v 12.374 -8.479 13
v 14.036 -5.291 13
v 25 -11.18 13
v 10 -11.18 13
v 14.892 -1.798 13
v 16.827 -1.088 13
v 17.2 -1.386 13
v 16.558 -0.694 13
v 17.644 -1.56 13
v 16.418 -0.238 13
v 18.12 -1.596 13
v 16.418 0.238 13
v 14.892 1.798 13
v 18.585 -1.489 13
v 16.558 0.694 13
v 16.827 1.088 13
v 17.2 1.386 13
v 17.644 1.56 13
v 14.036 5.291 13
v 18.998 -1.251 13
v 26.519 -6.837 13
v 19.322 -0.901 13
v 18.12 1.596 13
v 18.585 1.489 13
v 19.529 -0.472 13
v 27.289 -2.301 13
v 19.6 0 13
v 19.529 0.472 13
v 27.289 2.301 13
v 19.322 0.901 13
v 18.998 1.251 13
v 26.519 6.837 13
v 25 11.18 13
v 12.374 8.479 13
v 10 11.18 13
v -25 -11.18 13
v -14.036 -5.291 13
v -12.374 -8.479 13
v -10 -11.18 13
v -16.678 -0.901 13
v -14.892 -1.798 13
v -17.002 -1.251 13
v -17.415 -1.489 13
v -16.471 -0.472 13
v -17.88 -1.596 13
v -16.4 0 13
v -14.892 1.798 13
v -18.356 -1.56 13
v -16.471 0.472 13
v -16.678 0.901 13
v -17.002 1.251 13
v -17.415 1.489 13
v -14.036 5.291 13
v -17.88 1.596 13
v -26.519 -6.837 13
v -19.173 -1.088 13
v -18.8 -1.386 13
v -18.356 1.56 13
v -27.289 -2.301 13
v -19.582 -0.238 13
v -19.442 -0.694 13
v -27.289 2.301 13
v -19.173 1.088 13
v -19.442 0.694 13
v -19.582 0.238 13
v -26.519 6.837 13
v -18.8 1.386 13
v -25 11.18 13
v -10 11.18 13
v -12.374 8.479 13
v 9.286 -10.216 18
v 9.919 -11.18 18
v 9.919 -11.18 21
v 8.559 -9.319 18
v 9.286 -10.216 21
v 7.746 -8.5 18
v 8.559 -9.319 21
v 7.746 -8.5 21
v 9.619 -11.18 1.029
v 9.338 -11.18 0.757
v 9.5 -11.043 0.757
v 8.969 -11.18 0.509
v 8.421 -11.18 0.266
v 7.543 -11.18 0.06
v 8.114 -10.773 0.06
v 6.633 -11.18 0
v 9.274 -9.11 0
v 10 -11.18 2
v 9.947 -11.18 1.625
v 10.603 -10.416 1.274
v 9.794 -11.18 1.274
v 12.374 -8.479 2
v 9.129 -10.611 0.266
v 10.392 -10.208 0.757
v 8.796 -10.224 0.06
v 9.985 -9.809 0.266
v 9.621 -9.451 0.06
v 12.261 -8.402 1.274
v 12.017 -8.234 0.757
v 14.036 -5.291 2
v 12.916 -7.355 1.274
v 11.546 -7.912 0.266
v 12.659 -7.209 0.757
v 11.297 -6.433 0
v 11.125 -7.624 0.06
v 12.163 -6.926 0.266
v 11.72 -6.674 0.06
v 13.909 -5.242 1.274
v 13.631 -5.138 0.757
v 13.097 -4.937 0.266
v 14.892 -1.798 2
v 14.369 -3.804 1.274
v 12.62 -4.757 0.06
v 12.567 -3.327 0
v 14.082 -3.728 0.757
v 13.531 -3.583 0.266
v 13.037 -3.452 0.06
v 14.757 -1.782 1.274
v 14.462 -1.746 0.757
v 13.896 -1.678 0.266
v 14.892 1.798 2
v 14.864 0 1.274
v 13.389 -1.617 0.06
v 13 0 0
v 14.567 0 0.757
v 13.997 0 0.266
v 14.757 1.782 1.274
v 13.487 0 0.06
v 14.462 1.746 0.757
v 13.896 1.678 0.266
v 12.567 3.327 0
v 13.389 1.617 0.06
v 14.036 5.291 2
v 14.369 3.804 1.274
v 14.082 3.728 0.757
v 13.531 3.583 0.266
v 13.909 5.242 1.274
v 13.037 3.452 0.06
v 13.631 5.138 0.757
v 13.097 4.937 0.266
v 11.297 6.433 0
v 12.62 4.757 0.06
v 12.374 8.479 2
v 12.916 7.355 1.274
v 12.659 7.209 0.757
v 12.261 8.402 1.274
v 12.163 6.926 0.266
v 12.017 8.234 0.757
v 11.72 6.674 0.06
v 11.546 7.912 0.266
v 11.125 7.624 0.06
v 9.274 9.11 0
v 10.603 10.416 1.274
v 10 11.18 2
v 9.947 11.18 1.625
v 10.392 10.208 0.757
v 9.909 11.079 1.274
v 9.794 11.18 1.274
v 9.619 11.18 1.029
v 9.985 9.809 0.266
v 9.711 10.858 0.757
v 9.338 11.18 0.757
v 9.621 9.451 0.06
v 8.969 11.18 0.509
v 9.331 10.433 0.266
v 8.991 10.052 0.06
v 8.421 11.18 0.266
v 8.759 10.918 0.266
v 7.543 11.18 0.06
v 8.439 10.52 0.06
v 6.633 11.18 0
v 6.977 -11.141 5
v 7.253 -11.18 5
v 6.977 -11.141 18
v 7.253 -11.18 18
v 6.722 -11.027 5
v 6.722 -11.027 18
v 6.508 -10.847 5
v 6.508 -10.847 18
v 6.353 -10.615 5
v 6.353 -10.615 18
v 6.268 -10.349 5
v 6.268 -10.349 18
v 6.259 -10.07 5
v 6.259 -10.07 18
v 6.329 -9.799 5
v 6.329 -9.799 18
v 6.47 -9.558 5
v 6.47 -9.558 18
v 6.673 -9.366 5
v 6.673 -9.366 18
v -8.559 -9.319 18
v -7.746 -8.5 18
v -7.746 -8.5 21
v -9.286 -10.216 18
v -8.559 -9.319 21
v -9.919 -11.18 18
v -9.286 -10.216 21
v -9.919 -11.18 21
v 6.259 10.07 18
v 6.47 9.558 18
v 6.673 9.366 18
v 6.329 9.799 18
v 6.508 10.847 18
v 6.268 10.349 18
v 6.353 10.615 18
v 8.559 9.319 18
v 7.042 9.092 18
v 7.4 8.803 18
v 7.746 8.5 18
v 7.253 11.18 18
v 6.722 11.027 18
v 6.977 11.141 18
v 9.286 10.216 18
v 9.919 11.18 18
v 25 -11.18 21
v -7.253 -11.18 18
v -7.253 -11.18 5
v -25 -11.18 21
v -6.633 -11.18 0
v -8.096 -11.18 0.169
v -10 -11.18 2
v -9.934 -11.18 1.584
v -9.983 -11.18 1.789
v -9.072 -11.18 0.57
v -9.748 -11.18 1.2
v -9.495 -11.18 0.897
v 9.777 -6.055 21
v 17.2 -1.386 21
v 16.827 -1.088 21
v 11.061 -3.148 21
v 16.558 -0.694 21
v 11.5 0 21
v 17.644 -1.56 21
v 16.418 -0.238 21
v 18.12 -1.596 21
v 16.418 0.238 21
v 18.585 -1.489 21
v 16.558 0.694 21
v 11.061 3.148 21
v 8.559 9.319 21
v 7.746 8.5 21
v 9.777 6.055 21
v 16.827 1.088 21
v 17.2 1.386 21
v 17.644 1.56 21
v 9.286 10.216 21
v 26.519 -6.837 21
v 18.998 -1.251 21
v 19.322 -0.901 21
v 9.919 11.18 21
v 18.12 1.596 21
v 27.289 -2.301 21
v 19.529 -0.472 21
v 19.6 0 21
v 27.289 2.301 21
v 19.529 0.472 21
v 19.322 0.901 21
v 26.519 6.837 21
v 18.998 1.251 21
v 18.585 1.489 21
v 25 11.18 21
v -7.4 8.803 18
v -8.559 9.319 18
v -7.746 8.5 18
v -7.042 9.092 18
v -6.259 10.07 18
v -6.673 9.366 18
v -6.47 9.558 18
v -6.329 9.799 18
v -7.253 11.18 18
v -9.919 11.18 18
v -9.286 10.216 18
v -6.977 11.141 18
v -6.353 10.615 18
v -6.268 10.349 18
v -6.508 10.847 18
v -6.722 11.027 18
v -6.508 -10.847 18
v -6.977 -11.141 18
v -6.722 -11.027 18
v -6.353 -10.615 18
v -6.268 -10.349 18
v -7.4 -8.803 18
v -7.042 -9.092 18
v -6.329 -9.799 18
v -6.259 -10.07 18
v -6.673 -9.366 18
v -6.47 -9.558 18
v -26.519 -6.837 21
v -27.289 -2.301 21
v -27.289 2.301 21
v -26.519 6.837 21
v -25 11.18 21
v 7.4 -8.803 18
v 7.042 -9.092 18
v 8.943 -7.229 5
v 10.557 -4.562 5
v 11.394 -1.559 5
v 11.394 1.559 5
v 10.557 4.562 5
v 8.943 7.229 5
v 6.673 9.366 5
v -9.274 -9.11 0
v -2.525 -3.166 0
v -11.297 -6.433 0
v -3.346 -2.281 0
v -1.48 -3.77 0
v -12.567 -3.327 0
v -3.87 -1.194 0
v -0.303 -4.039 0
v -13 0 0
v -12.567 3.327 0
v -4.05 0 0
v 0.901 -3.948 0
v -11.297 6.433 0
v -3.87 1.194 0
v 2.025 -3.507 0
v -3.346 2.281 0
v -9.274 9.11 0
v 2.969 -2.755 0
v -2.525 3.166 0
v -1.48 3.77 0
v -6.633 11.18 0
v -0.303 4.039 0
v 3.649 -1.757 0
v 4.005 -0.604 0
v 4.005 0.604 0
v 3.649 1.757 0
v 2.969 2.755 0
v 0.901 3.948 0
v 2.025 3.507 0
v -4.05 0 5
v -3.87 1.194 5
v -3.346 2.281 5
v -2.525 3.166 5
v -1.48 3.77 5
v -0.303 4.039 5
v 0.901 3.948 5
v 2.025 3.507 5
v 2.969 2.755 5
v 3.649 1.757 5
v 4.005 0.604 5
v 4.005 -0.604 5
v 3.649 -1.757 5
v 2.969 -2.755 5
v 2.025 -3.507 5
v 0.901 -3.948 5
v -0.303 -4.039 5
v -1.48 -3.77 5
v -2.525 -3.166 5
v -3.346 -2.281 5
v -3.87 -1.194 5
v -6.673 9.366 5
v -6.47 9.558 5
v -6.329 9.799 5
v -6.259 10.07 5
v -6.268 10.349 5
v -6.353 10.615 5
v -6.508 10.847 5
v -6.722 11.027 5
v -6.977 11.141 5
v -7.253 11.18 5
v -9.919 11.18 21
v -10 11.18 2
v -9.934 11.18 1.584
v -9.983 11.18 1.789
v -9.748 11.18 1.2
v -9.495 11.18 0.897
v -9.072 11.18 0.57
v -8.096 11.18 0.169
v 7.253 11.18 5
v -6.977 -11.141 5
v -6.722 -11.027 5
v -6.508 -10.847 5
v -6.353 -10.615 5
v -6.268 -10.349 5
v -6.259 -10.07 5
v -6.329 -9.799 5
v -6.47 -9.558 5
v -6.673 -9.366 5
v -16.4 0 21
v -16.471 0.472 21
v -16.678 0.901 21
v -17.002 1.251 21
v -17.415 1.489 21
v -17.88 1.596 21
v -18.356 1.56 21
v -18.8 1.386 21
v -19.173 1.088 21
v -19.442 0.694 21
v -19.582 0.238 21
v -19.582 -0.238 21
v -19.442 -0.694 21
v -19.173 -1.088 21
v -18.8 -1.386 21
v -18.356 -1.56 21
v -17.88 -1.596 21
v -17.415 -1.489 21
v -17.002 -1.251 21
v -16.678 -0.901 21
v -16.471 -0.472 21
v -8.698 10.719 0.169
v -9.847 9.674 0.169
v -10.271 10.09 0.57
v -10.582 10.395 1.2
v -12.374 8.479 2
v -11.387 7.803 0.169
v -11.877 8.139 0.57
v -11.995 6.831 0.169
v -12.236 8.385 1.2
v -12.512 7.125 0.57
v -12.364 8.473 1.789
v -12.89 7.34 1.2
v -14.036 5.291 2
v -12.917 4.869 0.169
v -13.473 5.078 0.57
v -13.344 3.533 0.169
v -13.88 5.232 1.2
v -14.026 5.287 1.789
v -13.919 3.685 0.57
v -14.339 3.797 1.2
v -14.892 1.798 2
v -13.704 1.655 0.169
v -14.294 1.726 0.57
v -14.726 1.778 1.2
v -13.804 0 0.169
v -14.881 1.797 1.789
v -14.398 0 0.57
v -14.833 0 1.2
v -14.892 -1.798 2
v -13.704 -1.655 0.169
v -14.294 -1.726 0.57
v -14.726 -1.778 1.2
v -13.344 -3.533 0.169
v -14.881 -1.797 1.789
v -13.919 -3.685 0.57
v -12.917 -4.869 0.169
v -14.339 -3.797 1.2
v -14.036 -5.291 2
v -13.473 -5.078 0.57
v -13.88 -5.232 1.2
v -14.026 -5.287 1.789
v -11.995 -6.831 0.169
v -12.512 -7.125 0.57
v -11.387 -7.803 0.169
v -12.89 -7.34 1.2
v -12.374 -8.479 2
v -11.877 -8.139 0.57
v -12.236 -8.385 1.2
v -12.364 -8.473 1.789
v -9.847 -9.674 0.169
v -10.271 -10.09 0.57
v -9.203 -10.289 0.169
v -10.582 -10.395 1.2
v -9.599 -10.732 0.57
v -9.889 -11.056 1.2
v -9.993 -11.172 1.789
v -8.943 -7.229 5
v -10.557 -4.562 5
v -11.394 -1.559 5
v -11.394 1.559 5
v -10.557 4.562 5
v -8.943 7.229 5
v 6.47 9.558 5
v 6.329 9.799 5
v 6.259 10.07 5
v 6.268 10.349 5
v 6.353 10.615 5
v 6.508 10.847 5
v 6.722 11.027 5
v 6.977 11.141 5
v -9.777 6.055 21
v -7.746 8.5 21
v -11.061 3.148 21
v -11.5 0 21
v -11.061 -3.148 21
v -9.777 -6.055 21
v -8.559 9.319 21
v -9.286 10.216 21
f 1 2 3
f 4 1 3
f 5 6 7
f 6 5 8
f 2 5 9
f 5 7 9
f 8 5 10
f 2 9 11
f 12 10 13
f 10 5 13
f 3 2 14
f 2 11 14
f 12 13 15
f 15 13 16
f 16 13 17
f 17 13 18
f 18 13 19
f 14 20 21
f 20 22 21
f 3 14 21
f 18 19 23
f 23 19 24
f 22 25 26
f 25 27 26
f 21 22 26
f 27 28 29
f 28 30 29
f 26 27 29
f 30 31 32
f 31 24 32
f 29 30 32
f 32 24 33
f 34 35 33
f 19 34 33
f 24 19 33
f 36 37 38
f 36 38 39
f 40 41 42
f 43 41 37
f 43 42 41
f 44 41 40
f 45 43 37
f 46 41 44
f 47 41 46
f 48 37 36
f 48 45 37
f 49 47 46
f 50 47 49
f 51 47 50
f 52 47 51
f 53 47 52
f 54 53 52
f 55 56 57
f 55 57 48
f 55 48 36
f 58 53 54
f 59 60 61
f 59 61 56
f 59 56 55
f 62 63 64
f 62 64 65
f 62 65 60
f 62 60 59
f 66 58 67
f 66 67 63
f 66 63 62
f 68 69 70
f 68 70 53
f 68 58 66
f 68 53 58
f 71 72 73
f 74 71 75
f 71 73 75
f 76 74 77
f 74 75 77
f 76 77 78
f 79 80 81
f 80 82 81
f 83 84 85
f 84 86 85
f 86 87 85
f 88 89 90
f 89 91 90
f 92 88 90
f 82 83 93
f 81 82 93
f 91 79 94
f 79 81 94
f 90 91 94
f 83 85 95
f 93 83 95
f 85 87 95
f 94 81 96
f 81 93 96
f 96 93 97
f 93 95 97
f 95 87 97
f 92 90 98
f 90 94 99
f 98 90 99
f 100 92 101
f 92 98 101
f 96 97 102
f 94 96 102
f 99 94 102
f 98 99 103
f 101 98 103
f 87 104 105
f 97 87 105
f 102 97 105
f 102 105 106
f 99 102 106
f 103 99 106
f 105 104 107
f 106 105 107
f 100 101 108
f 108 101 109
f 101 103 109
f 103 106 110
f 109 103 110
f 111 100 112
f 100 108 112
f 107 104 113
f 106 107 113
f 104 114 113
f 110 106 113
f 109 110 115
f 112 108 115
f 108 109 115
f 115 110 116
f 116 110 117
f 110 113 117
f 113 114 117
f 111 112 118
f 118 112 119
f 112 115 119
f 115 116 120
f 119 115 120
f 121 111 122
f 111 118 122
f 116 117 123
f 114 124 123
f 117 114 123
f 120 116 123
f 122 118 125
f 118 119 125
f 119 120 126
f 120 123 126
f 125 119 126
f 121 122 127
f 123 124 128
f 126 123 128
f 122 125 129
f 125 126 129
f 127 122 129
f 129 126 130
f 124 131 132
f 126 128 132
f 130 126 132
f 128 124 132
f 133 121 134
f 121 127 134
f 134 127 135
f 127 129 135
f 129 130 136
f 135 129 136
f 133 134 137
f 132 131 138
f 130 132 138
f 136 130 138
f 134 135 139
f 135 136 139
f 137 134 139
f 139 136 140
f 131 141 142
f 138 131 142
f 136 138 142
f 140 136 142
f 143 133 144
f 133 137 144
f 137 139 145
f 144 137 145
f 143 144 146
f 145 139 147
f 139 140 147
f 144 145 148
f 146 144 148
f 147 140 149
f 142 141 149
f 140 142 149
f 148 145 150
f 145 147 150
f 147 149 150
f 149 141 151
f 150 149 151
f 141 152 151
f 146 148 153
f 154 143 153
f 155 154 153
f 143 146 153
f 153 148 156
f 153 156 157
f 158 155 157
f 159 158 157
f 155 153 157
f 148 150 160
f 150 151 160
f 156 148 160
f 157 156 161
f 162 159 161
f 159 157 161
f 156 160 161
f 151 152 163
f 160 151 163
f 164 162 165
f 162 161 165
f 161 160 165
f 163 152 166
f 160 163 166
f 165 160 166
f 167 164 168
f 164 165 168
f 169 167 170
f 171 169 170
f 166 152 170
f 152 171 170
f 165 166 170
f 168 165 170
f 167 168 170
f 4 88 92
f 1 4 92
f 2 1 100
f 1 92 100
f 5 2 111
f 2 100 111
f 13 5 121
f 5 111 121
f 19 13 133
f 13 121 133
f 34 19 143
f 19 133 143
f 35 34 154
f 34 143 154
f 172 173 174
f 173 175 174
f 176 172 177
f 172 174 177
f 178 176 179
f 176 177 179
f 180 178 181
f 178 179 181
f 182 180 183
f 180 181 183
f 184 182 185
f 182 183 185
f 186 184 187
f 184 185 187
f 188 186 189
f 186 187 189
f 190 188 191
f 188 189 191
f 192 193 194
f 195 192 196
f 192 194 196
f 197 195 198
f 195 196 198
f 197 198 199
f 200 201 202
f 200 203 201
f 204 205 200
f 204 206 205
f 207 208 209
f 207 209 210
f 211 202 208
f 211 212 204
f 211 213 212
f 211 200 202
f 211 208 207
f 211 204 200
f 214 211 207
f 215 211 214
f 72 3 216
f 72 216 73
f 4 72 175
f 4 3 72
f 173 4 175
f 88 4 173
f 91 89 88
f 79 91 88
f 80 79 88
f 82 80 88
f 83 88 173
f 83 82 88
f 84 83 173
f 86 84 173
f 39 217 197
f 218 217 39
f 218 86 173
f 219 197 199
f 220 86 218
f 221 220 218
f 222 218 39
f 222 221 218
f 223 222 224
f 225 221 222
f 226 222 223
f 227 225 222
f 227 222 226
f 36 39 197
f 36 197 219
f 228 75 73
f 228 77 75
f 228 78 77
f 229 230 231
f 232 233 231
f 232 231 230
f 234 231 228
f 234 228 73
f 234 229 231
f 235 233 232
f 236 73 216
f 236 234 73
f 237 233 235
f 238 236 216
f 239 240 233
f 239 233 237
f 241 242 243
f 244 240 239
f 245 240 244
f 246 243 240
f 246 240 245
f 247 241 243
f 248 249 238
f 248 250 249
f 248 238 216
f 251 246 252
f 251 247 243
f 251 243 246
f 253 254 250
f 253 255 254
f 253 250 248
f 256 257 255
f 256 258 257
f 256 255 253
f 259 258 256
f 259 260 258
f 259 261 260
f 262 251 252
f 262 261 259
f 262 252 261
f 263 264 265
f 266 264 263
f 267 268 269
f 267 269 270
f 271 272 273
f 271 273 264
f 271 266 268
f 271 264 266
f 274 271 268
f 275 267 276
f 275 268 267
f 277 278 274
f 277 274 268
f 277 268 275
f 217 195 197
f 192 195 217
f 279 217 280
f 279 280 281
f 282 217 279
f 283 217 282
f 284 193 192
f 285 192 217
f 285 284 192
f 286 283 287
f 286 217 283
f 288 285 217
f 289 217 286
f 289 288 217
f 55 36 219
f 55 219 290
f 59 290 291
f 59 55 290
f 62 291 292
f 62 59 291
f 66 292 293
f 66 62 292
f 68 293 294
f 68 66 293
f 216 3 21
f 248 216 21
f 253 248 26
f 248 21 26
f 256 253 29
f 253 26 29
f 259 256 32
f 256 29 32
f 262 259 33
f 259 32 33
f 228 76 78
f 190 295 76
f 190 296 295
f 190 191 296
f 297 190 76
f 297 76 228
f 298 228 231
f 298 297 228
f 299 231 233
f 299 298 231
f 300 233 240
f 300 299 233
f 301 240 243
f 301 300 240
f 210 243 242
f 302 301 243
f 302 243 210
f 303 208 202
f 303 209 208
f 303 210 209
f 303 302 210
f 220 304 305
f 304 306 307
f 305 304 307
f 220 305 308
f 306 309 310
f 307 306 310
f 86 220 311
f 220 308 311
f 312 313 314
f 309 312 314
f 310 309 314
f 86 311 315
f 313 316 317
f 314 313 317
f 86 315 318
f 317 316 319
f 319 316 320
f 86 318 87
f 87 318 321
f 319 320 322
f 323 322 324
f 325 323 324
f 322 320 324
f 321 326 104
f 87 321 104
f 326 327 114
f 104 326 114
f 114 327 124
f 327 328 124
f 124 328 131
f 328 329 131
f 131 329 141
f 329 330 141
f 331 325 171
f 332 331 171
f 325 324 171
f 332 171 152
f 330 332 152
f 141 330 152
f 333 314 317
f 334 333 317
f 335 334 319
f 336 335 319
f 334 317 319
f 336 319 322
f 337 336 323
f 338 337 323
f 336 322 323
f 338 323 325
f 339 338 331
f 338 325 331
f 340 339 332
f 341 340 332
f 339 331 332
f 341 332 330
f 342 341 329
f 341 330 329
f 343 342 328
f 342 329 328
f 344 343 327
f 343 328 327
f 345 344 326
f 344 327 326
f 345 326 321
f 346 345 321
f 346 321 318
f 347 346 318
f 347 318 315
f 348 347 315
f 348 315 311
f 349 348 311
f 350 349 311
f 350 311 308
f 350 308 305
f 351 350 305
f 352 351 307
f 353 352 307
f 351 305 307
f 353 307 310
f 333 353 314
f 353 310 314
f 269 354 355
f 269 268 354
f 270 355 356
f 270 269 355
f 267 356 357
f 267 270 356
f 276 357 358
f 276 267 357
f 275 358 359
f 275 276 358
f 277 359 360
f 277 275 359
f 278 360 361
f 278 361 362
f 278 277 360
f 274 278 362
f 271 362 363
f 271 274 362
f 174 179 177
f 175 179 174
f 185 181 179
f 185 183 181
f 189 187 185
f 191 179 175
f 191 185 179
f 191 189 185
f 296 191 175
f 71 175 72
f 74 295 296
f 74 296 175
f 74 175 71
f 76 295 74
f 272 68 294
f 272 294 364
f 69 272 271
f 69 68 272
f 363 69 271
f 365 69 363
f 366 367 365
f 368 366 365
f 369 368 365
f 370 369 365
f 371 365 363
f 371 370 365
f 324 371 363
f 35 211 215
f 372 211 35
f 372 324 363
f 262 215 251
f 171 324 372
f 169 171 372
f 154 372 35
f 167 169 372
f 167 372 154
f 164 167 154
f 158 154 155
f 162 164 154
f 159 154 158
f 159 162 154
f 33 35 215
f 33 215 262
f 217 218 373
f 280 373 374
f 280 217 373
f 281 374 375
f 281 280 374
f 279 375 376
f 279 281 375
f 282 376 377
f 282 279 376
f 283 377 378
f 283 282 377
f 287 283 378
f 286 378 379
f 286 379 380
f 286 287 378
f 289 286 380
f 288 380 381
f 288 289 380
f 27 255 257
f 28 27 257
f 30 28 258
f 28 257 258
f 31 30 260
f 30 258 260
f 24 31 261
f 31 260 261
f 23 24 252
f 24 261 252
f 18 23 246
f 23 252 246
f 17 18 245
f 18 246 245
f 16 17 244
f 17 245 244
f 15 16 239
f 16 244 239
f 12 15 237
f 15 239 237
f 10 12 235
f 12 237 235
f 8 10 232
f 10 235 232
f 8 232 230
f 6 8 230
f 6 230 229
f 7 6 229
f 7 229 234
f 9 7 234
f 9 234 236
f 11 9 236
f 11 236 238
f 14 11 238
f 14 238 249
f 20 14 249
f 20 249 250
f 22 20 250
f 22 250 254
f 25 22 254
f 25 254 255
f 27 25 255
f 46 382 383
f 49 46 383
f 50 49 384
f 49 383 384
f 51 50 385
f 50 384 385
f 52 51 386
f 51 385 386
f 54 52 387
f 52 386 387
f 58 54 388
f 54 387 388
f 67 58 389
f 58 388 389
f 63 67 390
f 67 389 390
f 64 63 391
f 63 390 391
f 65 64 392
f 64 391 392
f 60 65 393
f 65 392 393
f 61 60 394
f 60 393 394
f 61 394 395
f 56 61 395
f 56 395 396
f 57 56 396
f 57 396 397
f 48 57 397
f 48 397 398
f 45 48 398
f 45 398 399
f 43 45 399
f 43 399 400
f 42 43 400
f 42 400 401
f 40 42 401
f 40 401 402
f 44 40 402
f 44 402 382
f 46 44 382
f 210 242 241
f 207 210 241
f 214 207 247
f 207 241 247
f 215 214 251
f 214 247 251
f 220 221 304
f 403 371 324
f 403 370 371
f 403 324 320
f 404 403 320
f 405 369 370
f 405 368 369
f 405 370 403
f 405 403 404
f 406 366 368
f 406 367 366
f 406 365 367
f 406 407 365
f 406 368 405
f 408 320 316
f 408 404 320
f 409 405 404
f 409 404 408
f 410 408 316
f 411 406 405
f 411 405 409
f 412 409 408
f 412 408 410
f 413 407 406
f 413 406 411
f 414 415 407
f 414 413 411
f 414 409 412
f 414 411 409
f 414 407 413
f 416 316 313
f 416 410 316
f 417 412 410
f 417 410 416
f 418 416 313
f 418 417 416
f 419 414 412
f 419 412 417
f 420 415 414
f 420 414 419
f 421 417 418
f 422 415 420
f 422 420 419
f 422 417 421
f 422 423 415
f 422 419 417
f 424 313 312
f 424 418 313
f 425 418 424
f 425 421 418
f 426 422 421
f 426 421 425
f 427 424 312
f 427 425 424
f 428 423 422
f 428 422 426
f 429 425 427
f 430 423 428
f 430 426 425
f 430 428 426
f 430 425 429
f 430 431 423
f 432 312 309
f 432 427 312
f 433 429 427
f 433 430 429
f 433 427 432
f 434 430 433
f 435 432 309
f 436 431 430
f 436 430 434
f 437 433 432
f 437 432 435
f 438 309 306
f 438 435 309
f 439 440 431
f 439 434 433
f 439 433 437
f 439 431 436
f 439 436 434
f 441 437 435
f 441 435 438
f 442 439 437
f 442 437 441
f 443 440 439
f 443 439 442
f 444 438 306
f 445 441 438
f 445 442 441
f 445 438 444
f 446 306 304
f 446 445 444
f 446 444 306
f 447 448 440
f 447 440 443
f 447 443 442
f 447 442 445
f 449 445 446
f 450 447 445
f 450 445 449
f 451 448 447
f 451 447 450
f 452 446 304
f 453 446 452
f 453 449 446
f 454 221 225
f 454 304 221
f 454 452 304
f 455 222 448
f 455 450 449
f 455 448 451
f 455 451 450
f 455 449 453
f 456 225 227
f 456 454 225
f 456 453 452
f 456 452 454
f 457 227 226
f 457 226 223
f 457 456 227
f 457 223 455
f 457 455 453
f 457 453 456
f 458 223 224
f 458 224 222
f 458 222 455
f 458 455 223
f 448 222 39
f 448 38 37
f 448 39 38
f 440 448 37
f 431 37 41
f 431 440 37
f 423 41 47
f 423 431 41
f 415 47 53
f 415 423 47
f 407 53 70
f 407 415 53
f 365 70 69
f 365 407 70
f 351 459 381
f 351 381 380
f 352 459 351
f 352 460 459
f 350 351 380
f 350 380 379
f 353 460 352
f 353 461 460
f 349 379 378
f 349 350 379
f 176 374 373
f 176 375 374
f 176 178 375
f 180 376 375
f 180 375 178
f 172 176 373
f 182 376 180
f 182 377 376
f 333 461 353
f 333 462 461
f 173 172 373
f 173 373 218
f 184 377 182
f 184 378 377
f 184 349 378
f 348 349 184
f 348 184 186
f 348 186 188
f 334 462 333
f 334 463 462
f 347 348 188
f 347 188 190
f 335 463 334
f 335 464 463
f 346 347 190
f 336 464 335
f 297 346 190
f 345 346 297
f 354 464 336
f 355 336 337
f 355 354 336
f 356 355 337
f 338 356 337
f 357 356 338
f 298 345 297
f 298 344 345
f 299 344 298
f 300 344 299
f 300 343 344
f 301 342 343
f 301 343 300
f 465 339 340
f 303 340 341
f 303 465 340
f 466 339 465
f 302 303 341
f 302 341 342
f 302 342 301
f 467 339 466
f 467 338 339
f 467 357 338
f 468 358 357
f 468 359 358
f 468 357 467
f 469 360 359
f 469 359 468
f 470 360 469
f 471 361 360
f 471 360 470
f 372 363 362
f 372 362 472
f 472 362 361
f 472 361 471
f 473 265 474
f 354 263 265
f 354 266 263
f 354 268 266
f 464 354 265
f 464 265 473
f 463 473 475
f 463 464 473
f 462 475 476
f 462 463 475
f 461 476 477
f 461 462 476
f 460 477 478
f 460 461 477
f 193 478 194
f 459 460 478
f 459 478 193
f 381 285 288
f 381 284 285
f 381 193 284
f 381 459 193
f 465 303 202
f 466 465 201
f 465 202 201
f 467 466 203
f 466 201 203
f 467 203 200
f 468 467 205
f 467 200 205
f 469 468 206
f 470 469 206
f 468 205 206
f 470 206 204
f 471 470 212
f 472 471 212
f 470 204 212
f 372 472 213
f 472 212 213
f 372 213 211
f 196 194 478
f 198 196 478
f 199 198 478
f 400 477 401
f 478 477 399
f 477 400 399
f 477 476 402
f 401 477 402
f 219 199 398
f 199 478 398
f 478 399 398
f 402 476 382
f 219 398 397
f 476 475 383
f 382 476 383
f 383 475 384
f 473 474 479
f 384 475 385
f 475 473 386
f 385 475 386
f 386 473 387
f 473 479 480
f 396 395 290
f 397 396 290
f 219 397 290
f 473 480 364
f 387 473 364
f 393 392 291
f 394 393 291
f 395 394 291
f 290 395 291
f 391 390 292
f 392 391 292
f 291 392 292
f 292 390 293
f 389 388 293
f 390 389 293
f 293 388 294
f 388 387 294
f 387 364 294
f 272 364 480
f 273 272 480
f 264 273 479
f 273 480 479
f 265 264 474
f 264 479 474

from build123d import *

# Parameters (mm, degrees)
SKETCH_1_W          = 20
SKETCH_1_H          = 22.3606797749979
EXTRUDE_1_DEPTH     = 5
SKETCH_2_R          = 4.05
CUT_EXTRUDE_1_DEPTH = 5
EXTRUDE_2_DEPTH     = 16
EXTRUDE_START       = -8
EXTRUDE_3_DEPTH     = 8
SKETCH_5_R          = 11.5
CUT_EXTRUDE_2_DEPTH = 3
FILLET_2_R          = 2
SKETCH_6_R          = 1.6000000000000016
CUT_EXTRUDE_3_DEPTH = 13
FILLET_3_R          = 1


with BuildPart() as part:
    # 草图1 → 凸台-拉伸1 (new body)
    with BuildSketch(Plane.XY):
        with BuildLine():
            Line((-10, -11.18033988749895), (-10, 11.18033988749895))
            ThreePointArc((-10, 11.180339887498945), (-14.999999999999998, 1.84e-15), (-10.000000000000004, -11.180339887498944))
        make_face()
        Rectangle(SKETCH_1_W, SKETCH_1_H)
        with BuildLine():
            ThreePointArc((14.999999999999998, 0), (13.69306393762915, 6.123724356957945), (9.999999999999998, 11.180339887498947))
            Line((10, 11.18033988749895), (10, -11.18033988749895))
            ThreePointArc((9.999999999999998, -11.180339887498947), (13.69306393762915, -6.123724356957946), (14.999999999999998, -3.67e-15))
        make_face()
    extrude(amount=EXTRUDE_1_DEPTH)

    # 草图2 → 切除-拉伸1 (cut)
    with BuildSketch(Plane(origin=(0, 0, 0), x_dir=(-1, 0, 0), z_dir=(0, 0, -1))):
        Circle(SKETCH_2_R)
    extrude(amount=-CUT_EXTRUDE_1_DEPTH, mode=Mode.SUBTRACT)

    # 草图3 → 凸台-拉伸2 (add)
    with BuildSketch(Plane.XY.offset(5)):
        with BuildLine():
            Line((-10, 11.18033988749895), (-2.6925824035672443, 11.18033988749895))
            ThreePointArc((-2.6925824035672443, 11.18033988749895), (-11.5, 1.41e-15), (-2.6925824035672443, -11.18033988749895))
            Line((-2.6925824035672443, -11.18033988749895), (-10, -11.18033988749895))
            ThreePointArc((-10, -11.18033988749895), (-15.000000000000002, 1.84e-15), (-10, 11.18033988749895))
        make_face()
        with BuildLine():
            Line((2.692582403567243, 11.18033988749895), (10, 11.18033988749895))
            ThreePointArc((10, 11.18033988749895), (15.000000000000002, 0), (10, -11.18033988749895))
            Line((10, -11.18033988749895), (2.6925824035672443, -11.18033988749895))
            ThreePointArc((2.6925824035672443, -11.18033988749895), (11.5, 0), (2.692582403567243, 11.18033988749895))
        make_face()
    extrude(amount=EXTRUDE_2_DEPTH)

    # 草图4 → 凸台-拉伸3 (add)
    with BuildSketch(Plane.XY.offset(21).offset(EXTRUDE_START)):
        with BuildLine():
            Line((10, -11.18033988749895), (25, -11.18033988749895))
            ThreePointArc((25, -11.18033988749895), (27.386127875258307, 0), (25, 11.180339887498949))
            Line((25, 11.180339887498949), (10, 11.18033988749895))
            ThreePointArc((10, 11.18033988749895), (15.000000000000002, 0), (10, -11.18033988749895))
        make_face()
    extrude_3 = extrude(amount=EXTRUDE_3_DEPTH)

    # 镜向1: 凸台-拉伸3 across plane
    add(extrude_3.mirror(Plane(origin=(0, 0, 0), x_dir=(0, 0, 1), z_dir=(1, 0, 0))))

    # 草图5 → 切除-拉伸2 (cut)
    with BuildSketch(Plane.XY.offset(21)):
        with Locations((0, 17)):
            Circle(SKETCH_5_R)
        with Locations((0, -17)):
            Circle(SKETCH_5_R)
    extrude(amount=-CUT_EXTRUDE_2_DEPTH, mode=Mode.SUBTRACT)

    # 圆角2
    fillet_2_edges = [part.edges().sort_by_distance(p)[0] for p in [
        (14.999999999999998, 3.55e-15, 0),
        (-14.999999999999996, 2.22e-15, 0),
    ]]
    fillet(fillet_2_edges, radius=FILLET_2_R)

    # 草图6 → 切除-拉伸3 (cut)
    with BuildSketch(Plane.XY.offset(21)):
        with Locations((18, 0)):
            Circle(SKETCH_6_R)
        with Locations((-18, 0)):
            Circle(SKETCH_6_R)
    extrude(amount=-CUT_EXTRUDE_3_DEPTH, mode=Mode.SUBTRACT)

    # 圆角3
    fillet_3_edges = [part.edges().sort_by_distance(p)[0] for p in [
        (2.6925824035672443, -11.18033988749895, 11.5),
        (2.6925824035672443, 11.18033988749895, 11.5),
        (-2.6925824035672443, 11.18033988749895, 11.5),
        (-2.6925824035672434, -11.18033988749895, 11.5),
    ]]
    fillet(fillet_3_edges, radius=FILLET_3_R)


solid = part.part
